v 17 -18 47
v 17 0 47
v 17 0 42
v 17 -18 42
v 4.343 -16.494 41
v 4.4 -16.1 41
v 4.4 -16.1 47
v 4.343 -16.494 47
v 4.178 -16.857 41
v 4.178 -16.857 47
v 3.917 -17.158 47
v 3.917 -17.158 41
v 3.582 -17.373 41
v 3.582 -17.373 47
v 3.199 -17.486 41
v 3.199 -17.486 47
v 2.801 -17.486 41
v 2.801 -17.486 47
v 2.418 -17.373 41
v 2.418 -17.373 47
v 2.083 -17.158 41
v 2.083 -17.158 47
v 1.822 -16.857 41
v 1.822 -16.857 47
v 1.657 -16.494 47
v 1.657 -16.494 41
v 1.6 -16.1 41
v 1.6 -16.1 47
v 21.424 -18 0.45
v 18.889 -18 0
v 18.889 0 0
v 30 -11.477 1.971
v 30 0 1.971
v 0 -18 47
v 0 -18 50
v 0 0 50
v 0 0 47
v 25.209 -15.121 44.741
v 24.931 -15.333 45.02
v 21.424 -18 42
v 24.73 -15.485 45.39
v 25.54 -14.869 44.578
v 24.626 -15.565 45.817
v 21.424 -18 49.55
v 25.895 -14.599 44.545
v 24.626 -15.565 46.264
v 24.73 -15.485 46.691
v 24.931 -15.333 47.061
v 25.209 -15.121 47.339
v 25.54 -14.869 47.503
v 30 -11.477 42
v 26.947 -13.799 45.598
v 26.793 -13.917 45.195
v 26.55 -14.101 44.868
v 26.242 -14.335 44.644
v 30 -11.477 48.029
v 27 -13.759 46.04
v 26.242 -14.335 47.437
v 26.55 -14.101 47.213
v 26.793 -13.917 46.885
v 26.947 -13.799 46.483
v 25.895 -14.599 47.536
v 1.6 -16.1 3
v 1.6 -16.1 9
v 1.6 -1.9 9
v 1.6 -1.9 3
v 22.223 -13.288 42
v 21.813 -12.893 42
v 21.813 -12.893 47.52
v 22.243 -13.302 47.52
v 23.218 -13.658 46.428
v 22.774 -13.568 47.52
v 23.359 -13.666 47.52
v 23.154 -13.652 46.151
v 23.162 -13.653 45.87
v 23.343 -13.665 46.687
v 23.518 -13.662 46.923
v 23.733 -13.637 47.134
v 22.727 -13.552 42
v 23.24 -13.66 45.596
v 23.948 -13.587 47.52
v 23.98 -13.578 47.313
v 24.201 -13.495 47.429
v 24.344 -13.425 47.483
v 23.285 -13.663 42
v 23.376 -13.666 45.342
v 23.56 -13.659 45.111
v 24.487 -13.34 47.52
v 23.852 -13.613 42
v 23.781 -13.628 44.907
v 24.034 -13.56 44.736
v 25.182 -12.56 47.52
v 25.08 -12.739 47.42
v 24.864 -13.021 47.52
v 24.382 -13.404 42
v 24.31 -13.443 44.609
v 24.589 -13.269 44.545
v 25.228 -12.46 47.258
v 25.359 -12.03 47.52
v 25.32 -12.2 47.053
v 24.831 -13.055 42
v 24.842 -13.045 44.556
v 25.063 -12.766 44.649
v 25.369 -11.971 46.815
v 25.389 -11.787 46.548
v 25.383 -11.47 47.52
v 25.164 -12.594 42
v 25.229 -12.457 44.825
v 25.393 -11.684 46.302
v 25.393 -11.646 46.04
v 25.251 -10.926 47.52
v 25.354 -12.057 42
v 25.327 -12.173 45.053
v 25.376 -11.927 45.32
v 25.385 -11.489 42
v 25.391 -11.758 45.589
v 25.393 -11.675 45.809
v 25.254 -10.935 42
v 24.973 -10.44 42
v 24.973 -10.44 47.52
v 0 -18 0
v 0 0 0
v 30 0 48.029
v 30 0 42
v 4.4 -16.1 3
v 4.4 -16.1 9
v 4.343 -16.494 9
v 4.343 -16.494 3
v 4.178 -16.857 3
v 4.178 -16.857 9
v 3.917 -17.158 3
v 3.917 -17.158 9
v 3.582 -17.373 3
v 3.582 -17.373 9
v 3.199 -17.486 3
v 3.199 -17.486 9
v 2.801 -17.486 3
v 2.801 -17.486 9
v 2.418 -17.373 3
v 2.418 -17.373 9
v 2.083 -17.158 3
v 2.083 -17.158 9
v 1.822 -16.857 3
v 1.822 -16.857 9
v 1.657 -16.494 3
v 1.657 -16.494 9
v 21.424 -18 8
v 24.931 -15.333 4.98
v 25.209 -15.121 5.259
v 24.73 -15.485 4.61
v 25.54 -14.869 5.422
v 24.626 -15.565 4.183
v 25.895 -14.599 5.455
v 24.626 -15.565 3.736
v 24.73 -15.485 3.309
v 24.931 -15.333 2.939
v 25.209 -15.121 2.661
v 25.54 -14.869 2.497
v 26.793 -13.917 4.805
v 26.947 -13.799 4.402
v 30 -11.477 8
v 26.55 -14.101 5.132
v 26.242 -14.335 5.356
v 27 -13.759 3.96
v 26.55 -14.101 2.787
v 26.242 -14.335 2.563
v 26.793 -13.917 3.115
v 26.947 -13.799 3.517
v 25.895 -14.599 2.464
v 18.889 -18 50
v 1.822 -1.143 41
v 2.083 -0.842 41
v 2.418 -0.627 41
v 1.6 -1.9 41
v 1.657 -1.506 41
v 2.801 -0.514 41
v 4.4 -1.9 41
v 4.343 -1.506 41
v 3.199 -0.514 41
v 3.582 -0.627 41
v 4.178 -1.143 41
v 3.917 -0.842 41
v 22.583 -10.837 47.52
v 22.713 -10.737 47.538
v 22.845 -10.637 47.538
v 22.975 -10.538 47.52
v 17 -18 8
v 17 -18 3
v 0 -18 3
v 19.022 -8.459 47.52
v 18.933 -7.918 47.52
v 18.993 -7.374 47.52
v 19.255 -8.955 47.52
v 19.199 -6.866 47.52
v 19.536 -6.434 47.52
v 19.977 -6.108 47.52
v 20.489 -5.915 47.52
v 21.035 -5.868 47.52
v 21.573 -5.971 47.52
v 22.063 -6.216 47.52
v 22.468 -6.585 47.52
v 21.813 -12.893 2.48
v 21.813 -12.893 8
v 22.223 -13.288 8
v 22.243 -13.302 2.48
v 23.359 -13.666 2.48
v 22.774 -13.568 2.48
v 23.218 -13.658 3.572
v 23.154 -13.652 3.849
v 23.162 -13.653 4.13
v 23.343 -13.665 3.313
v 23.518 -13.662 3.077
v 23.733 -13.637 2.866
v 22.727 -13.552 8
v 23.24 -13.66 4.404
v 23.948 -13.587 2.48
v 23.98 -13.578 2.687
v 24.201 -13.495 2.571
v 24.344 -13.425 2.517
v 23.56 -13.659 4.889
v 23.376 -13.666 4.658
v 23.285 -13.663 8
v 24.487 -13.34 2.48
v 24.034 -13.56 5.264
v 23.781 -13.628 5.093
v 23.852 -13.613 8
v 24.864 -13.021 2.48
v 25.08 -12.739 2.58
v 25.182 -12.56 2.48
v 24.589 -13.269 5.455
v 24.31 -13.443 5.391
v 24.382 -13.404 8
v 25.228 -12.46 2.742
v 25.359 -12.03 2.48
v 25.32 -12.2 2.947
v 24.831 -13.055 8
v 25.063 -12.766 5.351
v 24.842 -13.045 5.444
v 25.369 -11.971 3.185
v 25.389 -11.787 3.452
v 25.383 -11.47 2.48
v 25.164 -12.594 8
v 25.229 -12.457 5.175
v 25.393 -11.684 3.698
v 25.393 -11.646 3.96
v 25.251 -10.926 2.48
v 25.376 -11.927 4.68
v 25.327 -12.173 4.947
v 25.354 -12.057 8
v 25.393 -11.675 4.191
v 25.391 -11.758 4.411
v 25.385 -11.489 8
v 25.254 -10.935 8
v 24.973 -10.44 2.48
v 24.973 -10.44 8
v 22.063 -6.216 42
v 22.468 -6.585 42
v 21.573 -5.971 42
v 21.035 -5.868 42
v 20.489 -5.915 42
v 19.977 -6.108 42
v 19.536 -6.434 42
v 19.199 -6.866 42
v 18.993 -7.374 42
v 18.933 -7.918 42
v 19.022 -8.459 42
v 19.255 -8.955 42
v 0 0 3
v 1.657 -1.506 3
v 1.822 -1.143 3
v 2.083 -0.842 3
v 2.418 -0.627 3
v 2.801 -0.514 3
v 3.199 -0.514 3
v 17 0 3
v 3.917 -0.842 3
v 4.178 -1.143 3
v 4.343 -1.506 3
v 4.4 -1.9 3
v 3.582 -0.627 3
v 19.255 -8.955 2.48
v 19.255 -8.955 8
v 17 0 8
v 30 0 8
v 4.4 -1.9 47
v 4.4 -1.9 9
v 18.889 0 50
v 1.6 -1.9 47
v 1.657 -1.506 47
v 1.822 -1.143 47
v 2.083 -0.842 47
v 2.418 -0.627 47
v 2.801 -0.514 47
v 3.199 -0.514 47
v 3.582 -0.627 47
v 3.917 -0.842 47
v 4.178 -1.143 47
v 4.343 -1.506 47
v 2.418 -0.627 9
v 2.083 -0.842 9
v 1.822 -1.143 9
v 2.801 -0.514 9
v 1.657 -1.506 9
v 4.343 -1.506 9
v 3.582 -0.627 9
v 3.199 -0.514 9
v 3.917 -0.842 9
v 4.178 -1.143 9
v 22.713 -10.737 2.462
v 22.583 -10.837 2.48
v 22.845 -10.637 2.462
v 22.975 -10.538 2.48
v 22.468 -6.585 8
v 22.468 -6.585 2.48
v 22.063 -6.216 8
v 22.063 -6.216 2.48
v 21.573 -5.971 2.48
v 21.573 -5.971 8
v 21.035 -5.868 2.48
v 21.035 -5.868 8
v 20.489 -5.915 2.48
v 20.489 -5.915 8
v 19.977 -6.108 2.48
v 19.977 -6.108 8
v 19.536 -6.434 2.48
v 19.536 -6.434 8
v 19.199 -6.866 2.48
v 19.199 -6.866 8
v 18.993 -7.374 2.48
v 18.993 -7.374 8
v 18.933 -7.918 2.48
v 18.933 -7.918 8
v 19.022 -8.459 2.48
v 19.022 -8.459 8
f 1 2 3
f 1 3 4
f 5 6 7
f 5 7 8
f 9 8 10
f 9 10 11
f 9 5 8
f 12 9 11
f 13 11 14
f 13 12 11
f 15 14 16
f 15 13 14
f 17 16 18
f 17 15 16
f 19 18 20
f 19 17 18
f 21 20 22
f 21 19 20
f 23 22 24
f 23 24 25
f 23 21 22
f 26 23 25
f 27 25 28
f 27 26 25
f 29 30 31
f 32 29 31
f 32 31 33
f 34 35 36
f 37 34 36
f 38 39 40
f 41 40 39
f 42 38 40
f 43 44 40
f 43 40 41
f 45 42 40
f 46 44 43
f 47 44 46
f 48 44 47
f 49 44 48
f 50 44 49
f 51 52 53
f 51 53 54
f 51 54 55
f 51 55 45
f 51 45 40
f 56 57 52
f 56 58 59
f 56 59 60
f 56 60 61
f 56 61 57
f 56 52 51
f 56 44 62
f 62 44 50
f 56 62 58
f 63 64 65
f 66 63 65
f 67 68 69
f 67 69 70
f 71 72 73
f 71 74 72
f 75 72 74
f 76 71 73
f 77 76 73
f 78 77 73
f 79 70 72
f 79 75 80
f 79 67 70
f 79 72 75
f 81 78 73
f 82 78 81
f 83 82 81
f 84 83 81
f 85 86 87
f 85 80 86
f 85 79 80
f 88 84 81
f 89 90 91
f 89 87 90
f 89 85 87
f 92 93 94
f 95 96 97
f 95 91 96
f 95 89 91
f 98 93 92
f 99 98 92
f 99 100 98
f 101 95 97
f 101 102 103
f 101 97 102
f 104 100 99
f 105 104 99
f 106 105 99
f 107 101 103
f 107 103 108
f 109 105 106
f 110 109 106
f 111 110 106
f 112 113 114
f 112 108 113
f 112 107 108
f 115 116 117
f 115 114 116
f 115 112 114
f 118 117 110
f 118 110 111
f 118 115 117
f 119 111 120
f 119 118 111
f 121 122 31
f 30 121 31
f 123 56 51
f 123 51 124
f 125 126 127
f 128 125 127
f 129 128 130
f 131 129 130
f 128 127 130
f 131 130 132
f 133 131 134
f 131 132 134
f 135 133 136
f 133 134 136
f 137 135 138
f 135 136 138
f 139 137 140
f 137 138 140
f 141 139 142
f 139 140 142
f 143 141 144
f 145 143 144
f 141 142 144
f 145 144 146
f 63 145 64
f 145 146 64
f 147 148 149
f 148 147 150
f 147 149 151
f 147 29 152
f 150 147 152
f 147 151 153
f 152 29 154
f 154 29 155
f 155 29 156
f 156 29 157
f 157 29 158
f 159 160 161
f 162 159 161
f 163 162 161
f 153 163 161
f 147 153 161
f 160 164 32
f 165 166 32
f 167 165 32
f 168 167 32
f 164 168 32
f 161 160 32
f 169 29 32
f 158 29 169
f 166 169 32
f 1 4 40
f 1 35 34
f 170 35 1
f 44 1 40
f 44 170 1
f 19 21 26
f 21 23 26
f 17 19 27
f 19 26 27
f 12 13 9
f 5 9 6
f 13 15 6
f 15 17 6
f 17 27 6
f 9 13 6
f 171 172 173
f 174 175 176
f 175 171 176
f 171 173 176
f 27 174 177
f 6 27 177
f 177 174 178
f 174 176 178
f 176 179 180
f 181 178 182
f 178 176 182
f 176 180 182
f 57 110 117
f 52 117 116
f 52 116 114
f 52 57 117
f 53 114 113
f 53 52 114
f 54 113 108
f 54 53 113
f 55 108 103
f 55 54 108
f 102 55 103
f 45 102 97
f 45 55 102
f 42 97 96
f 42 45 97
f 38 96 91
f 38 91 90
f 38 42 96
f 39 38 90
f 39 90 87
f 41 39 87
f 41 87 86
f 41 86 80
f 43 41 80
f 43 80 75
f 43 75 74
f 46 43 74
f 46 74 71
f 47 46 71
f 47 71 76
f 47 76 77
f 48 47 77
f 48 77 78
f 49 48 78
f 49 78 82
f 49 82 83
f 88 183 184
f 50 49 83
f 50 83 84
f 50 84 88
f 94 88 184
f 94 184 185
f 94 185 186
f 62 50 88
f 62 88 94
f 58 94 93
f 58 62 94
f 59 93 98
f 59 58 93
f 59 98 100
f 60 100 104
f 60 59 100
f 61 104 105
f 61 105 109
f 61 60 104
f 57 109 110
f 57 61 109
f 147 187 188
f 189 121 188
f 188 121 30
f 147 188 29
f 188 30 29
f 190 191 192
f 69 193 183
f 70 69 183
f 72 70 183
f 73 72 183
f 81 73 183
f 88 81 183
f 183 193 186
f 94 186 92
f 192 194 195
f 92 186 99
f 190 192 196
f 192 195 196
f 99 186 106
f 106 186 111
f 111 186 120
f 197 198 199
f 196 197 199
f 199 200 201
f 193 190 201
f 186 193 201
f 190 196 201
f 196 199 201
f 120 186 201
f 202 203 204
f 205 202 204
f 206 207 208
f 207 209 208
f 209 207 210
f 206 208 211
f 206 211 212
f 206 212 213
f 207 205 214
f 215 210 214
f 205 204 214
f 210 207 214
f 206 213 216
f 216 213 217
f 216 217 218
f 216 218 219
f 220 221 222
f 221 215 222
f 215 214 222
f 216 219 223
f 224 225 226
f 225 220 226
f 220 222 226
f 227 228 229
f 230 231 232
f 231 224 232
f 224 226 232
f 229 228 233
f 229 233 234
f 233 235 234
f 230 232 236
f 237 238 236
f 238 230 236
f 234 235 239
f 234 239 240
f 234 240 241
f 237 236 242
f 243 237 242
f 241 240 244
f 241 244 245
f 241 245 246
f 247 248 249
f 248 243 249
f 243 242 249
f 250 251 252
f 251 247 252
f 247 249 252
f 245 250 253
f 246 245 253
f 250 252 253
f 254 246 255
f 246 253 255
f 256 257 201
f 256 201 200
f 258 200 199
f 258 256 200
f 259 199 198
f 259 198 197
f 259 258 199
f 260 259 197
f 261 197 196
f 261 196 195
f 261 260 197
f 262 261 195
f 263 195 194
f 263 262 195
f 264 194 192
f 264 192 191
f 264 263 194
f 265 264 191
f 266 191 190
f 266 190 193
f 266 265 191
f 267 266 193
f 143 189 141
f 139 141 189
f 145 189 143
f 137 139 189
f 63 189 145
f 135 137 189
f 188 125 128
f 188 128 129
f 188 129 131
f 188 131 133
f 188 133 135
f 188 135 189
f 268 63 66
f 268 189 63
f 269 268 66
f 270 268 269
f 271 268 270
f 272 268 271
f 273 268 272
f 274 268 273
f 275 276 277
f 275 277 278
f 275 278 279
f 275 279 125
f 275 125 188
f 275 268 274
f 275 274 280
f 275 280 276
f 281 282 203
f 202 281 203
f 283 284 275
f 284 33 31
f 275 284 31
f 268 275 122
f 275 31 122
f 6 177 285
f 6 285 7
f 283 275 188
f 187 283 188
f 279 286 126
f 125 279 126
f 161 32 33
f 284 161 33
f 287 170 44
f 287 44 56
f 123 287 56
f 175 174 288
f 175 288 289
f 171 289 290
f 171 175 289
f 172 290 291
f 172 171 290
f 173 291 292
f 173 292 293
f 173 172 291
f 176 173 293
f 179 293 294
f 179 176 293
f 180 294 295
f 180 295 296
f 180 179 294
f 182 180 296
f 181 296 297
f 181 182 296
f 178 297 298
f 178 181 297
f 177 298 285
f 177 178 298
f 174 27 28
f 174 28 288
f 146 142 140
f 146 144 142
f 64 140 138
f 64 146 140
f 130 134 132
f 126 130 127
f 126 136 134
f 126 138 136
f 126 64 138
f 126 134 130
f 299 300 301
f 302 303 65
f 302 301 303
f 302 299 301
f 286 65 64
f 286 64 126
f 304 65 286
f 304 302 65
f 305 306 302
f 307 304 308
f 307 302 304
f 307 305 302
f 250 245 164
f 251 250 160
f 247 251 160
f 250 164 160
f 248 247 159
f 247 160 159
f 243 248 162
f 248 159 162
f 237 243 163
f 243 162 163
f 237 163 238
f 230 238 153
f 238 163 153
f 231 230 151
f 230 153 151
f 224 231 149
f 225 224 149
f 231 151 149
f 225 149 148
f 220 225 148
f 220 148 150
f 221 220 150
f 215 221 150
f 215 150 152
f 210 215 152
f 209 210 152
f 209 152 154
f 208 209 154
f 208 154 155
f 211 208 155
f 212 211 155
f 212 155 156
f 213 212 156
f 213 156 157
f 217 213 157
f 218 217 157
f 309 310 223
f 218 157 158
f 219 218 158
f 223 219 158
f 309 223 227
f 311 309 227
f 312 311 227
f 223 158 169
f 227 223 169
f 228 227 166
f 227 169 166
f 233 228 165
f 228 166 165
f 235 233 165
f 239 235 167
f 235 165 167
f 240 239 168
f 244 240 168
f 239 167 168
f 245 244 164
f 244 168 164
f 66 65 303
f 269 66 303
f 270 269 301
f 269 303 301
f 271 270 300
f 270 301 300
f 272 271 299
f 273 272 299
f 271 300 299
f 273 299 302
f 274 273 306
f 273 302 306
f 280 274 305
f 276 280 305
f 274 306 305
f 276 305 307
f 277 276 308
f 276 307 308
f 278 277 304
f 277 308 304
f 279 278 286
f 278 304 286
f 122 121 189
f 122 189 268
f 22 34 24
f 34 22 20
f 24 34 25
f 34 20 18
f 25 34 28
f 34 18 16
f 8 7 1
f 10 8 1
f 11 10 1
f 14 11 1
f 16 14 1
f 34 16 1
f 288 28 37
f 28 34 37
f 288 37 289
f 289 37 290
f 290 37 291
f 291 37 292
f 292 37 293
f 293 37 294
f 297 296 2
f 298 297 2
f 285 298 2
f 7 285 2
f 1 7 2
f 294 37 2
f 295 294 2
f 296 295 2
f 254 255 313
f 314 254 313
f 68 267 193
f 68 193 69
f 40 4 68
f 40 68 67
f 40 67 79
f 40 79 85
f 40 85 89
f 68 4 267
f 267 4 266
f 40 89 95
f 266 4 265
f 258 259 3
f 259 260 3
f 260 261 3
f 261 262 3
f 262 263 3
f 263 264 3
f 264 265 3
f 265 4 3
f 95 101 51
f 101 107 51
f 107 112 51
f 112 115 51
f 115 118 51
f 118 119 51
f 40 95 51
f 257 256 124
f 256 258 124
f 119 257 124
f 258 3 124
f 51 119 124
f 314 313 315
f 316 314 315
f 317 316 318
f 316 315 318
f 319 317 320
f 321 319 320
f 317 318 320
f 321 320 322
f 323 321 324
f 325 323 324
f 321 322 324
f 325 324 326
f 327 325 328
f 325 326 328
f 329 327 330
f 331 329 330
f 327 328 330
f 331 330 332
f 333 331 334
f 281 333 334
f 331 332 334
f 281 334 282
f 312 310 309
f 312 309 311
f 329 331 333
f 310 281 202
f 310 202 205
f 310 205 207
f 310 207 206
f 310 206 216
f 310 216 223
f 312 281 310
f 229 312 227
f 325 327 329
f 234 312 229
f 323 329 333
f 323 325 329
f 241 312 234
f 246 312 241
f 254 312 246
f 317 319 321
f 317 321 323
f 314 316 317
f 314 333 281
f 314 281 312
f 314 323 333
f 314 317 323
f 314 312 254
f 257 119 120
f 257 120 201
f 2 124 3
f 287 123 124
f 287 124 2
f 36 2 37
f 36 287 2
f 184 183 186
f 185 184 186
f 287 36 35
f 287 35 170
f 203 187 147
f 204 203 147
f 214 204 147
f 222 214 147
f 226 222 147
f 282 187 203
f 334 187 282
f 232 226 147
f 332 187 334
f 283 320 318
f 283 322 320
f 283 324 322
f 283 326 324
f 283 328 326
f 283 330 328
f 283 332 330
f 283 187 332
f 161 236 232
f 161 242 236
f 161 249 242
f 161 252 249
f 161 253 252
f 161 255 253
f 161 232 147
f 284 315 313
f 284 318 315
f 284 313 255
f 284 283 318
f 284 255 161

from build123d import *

# Parameters (mm, degrees)
F0_W      = 30
F0_H      = 18
F1_DEPTH  = 9
F2_W      = 30
F2_H      = 18
F3_DEPTH  = 6
F5_DEPTH  = 25
F7_DEPTH  = 5
F8_R      = 1.5
F9_DEPTH  = 5
F11_DEPTH = 5.52
F13_DEPTH = 25


with BuildPart() as f1:
    # F0 (on Top) → F1 (new body)
    with BuildSketch(Plane.XY):
        with Locations((15, -9)):
            Rectangle(F0_W, F0_H)
    extrude(amount=F1_DEPTH)

    # F2 (on face) → F3 (cut)
    with BuildSketch(Plane.XY.offset(9)):
        with Locations((15, -9)):
            Rectangle(F2_W, F2_H)
        with BuildLine():
            ThreePointArc((1.6, -1.9), (3, -0.5), (4.4, -1.9))
            Line((4.4, -1.9), (4.4, -16.1))
            ThreePointArc((4.4, -16.1), (3, -17.5), (1.6, -16.1))
            Line((1.6, -16.1), (1.6, -1.9))
        make_face(mode=Mode.SUBTRACT)
    extrude(amount=-F3_DEPTH, mode=Mode.SUBTRACT)

    # F4 (on face) → F5 (cut)
    with BuildSketch(Plane.XY.offset(3)):
        Polygon((30, -11.476942338), (21.424215287, -18), (30, -18), align=None)
    extrude(amount=-F5_DEPTH, mode=Mode.SUBTRACT)

    # F6 (on face) → F7 (join)
    with BuildSketch(Plane.XY.offset(3)):
        Polygon((30, -11.476942338), (30, 0), (17, 0), (17, -11.476942338), (17, -18), (21.424215287, -18), align=None)
    extrude(amount=F7_DEPTH)

    # F8 (on face) → F9 (cut)
    with BuildSketch(Plane(origin=(16.5256296321, -21.7260446429, 0), x_dir=(0.7959179518, 0.6054045044, 0), z_dir=(0.6054045044, -0.7959179518, 0))):
        with Locations((11.6600664333, 3.9596073329)):
            Circle(F8_R)
    extrude(amount=-F9_DEPTH, mode=Mode.SUBTRACT)

    # F10 (on face) → F11 (cut)
    with BuildSketch(Plane.XY.offset(8)):
        with BuildLine():
            Line((19.254878048, -8.9549584287), (21.8133040316, -12.8929519365))
            ThreePointArc((21.8133040316, -12.8929519365), (24.6189354383, -13.2459612648), (24.9732833017, -10.4404985993))
            Line((24.9732833017, -10.4404985993), (22.4684233059, -6.584955205))
            ThreePointArc((22.4684233059, -6.584955205), (19.7449236449, -6.2557593582), (19.254878048, -8.9549584287))
        make_face()
    extrude(amount=-F11_DEPTH, mode=Mode.SUBTRACT)

    # F12 (on face) → F13 (cut)
    with BuildSketch(Plane(origin=(0, 0, 0), x_dir=(-1, 0, 0), z_dir=(0, 1, 0))):
        Polygon((-18.8889801502, 0), (-30, 1.9705295563), (-30, 0), align=None)
    extrude(amount=-F13_DEPTH, mode=Mode.SUBTRACT)


with BuildPart() as f15_1:
    # F15: instance of F1
    add(f1.part.mirror(Plane.XY.offset(25)))


solid = Compound([f1.part, f15_1.part])
